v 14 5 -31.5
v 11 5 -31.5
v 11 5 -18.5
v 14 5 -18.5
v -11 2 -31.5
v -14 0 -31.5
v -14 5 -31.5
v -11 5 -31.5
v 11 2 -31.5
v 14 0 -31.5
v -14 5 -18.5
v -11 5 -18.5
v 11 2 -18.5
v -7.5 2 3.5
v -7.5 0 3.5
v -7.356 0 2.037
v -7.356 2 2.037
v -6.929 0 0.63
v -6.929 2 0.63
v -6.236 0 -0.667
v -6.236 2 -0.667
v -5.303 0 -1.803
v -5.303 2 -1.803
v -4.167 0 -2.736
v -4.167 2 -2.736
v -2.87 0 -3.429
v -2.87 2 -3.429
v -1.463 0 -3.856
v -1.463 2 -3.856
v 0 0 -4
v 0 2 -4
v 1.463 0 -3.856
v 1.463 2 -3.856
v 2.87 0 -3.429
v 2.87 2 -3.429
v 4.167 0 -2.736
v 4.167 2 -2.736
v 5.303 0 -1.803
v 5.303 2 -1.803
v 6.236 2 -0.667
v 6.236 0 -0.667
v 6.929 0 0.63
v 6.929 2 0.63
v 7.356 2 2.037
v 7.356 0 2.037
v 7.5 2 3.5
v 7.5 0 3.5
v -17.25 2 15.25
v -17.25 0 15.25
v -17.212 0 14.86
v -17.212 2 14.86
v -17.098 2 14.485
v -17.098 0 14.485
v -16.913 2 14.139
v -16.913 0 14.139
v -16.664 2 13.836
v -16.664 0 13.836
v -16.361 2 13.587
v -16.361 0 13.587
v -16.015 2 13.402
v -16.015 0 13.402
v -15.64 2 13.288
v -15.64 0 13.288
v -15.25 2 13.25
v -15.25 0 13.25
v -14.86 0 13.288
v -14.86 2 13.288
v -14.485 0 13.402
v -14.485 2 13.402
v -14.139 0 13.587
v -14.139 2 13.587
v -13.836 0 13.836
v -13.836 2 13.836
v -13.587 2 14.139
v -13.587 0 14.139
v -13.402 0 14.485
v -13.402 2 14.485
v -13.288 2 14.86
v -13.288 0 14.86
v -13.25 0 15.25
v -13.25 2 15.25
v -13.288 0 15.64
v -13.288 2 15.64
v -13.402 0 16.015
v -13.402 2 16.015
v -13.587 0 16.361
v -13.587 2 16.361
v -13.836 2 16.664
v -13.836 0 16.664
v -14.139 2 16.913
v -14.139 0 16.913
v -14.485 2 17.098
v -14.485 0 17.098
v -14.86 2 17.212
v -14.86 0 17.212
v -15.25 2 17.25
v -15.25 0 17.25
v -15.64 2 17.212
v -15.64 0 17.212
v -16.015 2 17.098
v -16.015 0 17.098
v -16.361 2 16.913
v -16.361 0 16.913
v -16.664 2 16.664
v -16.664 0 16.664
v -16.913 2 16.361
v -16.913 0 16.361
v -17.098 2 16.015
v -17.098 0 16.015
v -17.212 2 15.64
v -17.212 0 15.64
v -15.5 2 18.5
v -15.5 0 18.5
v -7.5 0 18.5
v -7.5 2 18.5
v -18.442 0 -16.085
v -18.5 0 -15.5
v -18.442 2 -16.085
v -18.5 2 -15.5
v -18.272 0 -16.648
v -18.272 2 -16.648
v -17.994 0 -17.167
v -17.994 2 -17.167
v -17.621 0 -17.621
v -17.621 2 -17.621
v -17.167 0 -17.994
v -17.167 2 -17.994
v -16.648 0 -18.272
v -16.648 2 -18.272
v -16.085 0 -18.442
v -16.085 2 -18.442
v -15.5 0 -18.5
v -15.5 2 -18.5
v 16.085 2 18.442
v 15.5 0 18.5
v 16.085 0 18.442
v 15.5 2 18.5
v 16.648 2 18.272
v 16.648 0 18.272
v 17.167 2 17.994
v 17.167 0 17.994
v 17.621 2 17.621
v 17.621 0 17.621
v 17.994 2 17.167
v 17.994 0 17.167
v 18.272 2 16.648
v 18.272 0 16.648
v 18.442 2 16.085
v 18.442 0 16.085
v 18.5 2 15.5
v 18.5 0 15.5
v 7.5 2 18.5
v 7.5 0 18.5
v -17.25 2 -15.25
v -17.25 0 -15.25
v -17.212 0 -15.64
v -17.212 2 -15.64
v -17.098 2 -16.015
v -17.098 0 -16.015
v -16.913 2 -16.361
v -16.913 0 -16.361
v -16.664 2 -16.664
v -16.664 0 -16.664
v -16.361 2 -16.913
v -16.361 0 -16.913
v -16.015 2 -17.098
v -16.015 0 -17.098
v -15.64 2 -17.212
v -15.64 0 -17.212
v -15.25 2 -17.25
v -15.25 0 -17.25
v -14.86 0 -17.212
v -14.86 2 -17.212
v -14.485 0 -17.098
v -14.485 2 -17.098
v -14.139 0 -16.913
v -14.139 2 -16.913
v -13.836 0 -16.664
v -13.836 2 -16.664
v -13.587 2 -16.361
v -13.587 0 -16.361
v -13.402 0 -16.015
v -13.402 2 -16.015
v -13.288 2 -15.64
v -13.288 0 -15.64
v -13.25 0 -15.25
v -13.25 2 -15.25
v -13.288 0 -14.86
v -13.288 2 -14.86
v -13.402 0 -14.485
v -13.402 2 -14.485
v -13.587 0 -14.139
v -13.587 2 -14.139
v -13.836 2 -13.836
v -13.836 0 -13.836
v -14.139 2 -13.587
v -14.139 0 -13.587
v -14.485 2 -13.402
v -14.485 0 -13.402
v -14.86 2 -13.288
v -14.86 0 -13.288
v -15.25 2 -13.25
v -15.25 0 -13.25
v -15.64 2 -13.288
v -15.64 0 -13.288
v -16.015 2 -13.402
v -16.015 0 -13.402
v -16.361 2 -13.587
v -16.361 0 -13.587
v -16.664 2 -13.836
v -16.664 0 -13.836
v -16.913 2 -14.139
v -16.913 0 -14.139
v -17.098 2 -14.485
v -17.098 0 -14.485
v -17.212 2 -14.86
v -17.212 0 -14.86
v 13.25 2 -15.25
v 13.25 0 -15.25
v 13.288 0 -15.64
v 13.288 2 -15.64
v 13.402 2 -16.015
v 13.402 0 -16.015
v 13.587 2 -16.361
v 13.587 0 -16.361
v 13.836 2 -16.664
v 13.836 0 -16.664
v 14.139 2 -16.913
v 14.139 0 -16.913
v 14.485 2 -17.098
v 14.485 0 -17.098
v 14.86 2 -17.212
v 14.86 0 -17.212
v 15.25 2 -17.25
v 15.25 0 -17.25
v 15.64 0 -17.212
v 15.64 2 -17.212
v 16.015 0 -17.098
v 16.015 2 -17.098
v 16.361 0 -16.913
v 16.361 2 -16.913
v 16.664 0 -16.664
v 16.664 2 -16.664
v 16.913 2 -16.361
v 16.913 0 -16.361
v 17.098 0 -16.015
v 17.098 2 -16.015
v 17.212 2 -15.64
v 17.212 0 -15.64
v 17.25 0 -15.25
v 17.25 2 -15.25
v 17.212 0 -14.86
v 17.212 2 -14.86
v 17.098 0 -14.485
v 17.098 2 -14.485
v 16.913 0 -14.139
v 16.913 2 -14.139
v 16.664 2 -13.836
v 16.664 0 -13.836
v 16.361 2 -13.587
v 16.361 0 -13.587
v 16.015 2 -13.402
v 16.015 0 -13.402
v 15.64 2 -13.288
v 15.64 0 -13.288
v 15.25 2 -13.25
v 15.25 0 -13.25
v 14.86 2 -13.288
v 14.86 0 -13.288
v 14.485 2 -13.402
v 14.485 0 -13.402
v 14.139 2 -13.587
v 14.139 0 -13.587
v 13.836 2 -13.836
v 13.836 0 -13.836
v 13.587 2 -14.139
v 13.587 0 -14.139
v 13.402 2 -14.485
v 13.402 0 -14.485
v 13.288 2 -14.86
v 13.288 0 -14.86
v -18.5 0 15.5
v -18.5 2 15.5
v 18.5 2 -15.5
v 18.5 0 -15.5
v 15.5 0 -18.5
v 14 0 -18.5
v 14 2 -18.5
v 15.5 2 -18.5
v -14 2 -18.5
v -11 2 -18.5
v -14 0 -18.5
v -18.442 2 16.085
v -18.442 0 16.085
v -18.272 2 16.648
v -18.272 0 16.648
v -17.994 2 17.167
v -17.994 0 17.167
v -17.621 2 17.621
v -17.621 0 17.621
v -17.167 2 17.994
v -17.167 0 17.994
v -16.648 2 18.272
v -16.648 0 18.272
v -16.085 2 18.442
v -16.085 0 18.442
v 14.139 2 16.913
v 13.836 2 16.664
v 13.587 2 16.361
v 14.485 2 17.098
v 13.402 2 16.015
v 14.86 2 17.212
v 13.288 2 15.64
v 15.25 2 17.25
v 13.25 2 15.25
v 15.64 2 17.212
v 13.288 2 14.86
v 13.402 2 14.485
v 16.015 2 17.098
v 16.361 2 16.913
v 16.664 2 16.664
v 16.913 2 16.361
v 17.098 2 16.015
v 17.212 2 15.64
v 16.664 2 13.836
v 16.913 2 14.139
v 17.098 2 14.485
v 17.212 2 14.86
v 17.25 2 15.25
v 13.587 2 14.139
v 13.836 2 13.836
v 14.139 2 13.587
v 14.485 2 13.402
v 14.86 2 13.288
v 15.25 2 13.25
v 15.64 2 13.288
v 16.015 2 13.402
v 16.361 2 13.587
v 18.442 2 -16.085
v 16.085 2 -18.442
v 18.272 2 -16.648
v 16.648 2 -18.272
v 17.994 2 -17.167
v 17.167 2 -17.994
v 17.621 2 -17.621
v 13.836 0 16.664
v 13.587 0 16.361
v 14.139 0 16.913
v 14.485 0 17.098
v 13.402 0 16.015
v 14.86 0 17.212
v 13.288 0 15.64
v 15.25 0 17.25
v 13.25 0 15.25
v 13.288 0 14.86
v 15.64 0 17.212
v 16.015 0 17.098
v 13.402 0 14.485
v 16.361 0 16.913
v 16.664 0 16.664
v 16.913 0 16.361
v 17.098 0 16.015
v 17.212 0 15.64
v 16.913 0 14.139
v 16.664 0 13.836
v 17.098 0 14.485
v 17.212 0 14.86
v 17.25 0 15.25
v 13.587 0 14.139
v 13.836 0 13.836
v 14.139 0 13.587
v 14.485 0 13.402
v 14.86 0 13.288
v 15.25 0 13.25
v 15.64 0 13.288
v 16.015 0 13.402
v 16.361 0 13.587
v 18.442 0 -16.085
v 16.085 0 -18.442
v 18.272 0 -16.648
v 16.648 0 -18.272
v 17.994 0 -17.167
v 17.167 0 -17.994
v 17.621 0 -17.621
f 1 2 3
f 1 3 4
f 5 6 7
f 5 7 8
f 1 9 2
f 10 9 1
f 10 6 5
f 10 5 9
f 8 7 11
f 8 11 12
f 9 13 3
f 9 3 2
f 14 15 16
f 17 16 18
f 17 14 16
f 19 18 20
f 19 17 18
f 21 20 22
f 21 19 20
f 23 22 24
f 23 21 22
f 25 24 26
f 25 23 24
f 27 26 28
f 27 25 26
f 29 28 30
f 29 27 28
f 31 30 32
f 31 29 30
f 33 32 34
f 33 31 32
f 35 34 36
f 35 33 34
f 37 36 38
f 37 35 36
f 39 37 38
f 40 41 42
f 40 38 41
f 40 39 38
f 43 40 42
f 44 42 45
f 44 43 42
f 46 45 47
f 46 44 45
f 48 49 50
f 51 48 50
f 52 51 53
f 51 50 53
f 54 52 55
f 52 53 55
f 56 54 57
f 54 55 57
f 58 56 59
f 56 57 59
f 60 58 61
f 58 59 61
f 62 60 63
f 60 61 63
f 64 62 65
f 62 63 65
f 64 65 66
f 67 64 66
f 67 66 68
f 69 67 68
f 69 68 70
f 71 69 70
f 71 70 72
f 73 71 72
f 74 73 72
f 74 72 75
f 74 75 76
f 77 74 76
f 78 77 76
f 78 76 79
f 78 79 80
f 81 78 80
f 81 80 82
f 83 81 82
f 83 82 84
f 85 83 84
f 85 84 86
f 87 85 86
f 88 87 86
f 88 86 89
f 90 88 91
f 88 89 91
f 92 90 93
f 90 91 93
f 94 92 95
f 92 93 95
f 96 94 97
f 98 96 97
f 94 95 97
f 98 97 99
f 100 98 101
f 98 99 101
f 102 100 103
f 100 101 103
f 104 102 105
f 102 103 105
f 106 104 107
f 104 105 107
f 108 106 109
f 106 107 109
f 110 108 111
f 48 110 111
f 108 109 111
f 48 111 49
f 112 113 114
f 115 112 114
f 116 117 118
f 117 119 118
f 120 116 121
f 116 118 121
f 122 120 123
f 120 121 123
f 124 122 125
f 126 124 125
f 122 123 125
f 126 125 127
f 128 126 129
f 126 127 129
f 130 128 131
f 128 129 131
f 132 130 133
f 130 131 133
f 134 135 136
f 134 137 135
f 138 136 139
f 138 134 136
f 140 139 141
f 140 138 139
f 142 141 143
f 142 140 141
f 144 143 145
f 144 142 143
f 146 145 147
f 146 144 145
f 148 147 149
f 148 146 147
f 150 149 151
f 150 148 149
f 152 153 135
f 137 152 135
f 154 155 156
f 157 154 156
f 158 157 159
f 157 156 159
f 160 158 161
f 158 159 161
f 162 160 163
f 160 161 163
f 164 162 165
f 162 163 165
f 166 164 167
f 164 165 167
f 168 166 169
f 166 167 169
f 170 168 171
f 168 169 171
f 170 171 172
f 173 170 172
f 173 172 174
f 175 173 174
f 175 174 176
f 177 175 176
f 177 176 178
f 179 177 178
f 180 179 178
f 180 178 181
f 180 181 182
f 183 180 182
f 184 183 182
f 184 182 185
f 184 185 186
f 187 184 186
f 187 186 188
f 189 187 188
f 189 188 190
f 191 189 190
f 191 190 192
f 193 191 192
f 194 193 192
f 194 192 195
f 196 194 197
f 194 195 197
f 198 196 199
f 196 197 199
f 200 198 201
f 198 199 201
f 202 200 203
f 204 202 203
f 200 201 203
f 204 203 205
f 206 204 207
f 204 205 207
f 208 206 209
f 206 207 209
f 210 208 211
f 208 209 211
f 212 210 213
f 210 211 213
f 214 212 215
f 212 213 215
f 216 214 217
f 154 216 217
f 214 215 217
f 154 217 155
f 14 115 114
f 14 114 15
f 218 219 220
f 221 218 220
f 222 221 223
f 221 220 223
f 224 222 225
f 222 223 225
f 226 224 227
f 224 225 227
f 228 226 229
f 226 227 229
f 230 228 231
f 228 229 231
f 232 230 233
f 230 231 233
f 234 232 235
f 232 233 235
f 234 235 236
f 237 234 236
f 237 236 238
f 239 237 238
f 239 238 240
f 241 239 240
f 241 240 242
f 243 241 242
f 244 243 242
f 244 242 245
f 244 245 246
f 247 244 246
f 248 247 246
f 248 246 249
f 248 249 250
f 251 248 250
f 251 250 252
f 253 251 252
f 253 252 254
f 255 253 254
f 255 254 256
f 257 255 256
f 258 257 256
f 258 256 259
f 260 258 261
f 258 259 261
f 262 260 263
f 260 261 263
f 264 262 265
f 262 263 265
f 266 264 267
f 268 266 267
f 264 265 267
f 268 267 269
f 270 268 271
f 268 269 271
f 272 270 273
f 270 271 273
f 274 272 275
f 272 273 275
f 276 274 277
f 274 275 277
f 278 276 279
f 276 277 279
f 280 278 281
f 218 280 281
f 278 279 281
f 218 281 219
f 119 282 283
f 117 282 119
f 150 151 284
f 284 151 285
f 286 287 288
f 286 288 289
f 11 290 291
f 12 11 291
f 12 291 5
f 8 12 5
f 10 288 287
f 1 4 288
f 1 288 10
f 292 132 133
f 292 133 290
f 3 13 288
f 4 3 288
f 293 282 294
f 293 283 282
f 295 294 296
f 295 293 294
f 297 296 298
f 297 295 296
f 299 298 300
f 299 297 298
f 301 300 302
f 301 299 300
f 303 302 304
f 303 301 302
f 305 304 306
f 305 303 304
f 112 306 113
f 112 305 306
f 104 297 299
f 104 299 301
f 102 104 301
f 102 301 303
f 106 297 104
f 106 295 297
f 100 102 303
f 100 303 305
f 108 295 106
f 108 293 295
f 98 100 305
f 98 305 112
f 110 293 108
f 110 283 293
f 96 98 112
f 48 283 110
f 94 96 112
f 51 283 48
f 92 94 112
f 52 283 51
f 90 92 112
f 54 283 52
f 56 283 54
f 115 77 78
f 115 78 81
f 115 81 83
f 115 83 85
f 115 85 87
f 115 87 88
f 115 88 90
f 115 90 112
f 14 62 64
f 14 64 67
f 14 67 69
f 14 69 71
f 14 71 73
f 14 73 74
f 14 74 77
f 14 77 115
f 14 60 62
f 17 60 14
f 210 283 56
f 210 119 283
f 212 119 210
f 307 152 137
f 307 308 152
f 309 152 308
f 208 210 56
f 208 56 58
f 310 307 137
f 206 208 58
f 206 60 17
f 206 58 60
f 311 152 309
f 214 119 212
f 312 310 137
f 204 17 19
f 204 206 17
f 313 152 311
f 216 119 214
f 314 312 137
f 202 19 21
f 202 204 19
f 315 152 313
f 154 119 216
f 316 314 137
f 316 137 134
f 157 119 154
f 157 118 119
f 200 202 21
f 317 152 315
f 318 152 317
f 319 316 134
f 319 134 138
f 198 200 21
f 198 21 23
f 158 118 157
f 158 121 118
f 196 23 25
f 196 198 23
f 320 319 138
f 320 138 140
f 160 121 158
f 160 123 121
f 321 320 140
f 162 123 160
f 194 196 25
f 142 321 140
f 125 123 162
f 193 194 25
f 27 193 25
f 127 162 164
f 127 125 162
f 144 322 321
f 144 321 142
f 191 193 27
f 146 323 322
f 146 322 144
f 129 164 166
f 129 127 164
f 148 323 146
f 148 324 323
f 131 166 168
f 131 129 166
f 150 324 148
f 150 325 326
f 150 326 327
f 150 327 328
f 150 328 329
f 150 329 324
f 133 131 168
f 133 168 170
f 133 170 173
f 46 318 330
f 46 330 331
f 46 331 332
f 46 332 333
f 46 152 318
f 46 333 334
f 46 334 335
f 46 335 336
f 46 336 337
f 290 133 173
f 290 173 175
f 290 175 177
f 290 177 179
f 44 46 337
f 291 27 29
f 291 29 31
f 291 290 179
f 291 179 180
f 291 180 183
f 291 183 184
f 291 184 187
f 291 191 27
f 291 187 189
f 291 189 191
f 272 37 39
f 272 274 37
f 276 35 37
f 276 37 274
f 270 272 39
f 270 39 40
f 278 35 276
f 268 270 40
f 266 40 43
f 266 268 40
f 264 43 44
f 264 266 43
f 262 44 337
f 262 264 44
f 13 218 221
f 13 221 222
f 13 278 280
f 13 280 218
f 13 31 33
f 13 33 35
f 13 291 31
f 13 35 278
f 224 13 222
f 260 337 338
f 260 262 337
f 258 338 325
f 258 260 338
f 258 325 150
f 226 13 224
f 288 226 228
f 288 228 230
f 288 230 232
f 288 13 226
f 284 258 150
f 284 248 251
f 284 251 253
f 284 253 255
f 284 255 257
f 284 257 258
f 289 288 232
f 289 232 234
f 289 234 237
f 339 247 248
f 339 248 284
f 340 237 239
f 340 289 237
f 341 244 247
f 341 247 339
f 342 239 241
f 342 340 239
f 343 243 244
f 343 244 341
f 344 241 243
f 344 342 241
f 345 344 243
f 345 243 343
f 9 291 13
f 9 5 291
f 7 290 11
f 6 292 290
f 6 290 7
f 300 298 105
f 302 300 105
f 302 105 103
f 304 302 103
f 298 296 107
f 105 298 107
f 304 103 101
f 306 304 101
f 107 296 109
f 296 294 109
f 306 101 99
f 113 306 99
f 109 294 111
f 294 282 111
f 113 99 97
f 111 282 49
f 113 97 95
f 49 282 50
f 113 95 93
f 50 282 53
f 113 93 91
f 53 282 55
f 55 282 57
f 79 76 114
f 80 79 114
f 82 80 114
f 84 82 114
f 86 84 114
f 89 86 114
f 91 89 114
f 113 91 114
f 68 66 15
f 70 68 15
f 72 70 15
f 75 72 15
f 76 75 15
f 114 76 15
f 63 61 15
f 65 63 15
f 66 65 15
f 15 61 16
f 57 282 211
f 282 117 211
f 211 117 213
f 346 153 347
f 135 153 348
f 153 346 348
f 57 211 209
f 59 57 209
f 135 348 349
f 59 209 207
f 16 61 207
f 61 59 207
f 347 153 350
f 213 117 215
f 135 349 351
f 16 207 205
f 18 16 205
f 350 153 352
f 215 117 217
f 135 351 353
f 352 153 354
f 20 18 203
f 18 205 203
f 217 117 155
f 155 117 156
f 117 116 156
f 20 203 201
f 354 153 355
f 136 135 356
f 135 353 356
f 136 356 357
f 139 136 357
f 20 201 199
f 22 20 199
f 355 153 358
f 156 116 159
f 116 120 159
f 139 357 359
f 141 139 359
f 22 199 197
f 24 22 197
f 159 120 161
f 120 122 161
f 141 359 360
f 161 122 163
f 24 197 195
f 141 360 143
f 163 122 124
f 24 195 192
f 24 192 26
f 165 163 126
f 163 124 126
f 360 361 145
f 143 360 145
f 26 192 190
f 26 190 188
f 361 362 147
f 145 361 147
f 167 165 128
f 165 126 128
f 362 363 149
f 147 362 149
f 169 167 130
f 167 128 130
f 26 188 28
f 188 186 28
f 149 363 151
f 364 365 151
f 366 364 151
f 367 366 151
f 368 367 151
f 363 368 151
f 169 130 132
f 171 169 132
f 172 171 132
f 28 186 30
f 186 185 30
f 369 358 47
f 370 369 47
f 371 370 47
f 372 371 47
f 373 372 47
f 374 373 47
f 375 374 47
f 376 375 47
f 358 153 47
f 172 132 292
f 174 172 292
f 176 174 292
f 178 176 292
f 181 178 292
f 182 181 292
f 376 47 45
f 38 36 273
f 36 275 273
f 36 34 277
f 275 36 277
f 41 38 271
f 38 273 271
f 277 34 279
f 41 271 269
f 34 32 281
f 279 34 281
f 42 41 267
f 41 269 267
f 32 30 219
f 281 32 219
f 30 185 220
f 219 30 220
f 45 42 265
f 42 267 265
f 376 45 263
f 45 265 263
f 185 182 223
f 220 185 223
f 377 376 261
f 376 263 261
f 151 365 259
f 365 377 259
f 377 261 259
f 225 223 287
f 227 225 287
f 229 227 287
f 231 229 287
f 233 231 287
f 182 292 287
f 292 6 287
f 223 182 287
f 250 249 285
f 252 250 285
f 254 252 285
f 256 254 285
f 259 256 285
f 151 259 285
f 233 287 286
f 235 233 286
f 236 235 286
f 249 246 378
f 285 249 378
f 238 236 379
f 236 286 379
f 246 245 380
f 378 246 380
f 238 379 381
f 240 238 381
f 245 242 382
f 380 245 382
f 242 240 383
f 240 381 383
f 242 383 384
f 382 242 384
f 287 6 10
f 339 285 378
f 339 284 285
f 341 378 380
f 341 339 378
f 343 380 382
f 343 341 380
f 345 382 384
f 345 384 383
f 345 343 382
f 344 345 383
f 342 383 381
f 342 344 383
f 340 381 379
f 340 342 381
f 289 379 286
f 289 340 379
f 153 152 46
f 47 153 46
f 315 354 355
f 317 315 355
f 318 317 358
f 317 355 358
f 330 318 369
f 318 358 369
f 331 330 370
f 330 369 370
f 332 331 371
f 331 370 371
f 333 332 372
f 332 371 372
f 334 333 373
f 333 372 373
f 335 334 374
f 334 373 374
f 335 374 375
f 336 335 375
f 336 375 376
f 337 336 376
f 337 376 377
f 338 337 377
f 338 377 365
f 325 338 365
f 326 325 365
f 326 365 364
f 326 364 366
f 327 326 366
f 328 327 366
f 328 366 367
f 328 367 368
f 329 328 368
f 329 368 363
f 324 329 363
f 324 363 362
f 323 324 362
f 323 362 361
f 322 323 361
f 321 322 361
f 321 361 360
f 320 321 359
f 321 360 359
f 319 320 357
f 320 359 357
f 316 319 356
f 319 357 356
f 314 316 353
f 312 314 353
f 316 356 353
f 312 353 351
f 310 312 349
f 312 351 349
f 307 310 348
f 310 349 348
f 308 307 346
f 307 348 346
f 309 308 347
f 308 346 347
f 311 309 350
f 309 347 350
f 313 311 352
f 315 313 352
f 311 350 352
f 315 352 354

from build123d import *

# Parameters (mm, degrees)
SKETCH1_W                = 37
SKETCH1_H                = 37
BOSS_EXTRUDE1_DEPTH      = 2
FILLET1_R                = 3
F_4_0_4_DIAMETER_HOLE1_D = 4
SKETCH6_W                = 28
SKETCH6_H                = 13
BOSS_EXTRUDE3_DEPTH      = 2
SKETCH7_W                = 3
SKETCH7_H                = 13
BOSS_EXTRUDE4_DEPTH      = 3
SKETCH8_W                = 15
SKETCH8_H                = 15
CUT_EXTRUDE1_DEPTH       = 37.653785616


with BuildPart() as part:
    # Sketch1 → Boss-Extrude1 (new body)
    with BuildSketch(Plane(origin=(0, 0, 0), x_dir=(1, 0, 0), z_dir=(0, 1, 0))):
        Rectangle(SKETCH1_W, SKETCH1_H)
    extrude(amount=BOSS_EXTRUDE1_DEPTH)

    # Fillet1
    fillet1_edges = [part.edges().sort_by_distance(p)[0] for p in [
        (-18.5, 1, -18.5),
        (18.5, 1, -18.5),
        (18.5, 1, 18.5),
        (-18.5, 1, 18.5),
    ]]
    fillet(fillet1_edges, radius=FILLET1_R)

    # Ø4.0 (4) Diameter Hole1 (through all)
    with Locations(Plane(origin=(0, 2, 0), x_dir=(1, 0, 0), z_dir=(0, 1, 0))):
        with Locations((-15.25, 15.25), (15.25, -15.25), (15.25, 15.25), (-15.25, -15.25)):
            Hole(F_4_0_4_DIAMETER_HOLE1_D / 2)

    # Sketch6 → Boss-Extrude3 (add, through all)
    with BuildSketch(Plane(origin=(0, 2, 0), x_dir=(1, 0, 0), z_dir=(0, 1, 0))):
        with Locations((0, 25)):
            Rectangle(SKETCH6_W, SKETCH6_H)
    extrude(amount=-BOSS_EXTRUDE3_DEPTH)

    # Sketch7 → Boss-Extrude4 (add)
    with BuildSketch(Plane(origin=(0, 2, 0), x_dir=(1, 0, 0), z_dir=(0, 1, 0))):
        with Locations((-12.5, 25)):
            Rectangle(SKETCH7_W, SKETCH7_H)
        with Locations((12.5, 25)):
            Rectangle(SKETCH7_W, SKETCH7_H)
    extrude(amount=BOSS_EXTRUDE4_DEPTH)

    # Sketch8 → Cut-Extrude1 (cut, through all)
    with BuildSketch(Plane(origin=(0, 2, 0), x_dir=(1, 0, 0), z_dir=(0, 1, 0))):
        with BuildLine():
            Line((7.5, -3.5), (-7.5, -3.5))
            ThreePointArc((-7.5, -3.5), (0, 4), (7.5, -3.5))
        make_face()
        with Locations((0, -11)):
            Rectangle(SKETCH8_W, SKETCH8_H)
    extrude(amount=-CUT_EXTRUDE1_DEPTH, mode=Mode.SUBTRACT)


solid = part.part
